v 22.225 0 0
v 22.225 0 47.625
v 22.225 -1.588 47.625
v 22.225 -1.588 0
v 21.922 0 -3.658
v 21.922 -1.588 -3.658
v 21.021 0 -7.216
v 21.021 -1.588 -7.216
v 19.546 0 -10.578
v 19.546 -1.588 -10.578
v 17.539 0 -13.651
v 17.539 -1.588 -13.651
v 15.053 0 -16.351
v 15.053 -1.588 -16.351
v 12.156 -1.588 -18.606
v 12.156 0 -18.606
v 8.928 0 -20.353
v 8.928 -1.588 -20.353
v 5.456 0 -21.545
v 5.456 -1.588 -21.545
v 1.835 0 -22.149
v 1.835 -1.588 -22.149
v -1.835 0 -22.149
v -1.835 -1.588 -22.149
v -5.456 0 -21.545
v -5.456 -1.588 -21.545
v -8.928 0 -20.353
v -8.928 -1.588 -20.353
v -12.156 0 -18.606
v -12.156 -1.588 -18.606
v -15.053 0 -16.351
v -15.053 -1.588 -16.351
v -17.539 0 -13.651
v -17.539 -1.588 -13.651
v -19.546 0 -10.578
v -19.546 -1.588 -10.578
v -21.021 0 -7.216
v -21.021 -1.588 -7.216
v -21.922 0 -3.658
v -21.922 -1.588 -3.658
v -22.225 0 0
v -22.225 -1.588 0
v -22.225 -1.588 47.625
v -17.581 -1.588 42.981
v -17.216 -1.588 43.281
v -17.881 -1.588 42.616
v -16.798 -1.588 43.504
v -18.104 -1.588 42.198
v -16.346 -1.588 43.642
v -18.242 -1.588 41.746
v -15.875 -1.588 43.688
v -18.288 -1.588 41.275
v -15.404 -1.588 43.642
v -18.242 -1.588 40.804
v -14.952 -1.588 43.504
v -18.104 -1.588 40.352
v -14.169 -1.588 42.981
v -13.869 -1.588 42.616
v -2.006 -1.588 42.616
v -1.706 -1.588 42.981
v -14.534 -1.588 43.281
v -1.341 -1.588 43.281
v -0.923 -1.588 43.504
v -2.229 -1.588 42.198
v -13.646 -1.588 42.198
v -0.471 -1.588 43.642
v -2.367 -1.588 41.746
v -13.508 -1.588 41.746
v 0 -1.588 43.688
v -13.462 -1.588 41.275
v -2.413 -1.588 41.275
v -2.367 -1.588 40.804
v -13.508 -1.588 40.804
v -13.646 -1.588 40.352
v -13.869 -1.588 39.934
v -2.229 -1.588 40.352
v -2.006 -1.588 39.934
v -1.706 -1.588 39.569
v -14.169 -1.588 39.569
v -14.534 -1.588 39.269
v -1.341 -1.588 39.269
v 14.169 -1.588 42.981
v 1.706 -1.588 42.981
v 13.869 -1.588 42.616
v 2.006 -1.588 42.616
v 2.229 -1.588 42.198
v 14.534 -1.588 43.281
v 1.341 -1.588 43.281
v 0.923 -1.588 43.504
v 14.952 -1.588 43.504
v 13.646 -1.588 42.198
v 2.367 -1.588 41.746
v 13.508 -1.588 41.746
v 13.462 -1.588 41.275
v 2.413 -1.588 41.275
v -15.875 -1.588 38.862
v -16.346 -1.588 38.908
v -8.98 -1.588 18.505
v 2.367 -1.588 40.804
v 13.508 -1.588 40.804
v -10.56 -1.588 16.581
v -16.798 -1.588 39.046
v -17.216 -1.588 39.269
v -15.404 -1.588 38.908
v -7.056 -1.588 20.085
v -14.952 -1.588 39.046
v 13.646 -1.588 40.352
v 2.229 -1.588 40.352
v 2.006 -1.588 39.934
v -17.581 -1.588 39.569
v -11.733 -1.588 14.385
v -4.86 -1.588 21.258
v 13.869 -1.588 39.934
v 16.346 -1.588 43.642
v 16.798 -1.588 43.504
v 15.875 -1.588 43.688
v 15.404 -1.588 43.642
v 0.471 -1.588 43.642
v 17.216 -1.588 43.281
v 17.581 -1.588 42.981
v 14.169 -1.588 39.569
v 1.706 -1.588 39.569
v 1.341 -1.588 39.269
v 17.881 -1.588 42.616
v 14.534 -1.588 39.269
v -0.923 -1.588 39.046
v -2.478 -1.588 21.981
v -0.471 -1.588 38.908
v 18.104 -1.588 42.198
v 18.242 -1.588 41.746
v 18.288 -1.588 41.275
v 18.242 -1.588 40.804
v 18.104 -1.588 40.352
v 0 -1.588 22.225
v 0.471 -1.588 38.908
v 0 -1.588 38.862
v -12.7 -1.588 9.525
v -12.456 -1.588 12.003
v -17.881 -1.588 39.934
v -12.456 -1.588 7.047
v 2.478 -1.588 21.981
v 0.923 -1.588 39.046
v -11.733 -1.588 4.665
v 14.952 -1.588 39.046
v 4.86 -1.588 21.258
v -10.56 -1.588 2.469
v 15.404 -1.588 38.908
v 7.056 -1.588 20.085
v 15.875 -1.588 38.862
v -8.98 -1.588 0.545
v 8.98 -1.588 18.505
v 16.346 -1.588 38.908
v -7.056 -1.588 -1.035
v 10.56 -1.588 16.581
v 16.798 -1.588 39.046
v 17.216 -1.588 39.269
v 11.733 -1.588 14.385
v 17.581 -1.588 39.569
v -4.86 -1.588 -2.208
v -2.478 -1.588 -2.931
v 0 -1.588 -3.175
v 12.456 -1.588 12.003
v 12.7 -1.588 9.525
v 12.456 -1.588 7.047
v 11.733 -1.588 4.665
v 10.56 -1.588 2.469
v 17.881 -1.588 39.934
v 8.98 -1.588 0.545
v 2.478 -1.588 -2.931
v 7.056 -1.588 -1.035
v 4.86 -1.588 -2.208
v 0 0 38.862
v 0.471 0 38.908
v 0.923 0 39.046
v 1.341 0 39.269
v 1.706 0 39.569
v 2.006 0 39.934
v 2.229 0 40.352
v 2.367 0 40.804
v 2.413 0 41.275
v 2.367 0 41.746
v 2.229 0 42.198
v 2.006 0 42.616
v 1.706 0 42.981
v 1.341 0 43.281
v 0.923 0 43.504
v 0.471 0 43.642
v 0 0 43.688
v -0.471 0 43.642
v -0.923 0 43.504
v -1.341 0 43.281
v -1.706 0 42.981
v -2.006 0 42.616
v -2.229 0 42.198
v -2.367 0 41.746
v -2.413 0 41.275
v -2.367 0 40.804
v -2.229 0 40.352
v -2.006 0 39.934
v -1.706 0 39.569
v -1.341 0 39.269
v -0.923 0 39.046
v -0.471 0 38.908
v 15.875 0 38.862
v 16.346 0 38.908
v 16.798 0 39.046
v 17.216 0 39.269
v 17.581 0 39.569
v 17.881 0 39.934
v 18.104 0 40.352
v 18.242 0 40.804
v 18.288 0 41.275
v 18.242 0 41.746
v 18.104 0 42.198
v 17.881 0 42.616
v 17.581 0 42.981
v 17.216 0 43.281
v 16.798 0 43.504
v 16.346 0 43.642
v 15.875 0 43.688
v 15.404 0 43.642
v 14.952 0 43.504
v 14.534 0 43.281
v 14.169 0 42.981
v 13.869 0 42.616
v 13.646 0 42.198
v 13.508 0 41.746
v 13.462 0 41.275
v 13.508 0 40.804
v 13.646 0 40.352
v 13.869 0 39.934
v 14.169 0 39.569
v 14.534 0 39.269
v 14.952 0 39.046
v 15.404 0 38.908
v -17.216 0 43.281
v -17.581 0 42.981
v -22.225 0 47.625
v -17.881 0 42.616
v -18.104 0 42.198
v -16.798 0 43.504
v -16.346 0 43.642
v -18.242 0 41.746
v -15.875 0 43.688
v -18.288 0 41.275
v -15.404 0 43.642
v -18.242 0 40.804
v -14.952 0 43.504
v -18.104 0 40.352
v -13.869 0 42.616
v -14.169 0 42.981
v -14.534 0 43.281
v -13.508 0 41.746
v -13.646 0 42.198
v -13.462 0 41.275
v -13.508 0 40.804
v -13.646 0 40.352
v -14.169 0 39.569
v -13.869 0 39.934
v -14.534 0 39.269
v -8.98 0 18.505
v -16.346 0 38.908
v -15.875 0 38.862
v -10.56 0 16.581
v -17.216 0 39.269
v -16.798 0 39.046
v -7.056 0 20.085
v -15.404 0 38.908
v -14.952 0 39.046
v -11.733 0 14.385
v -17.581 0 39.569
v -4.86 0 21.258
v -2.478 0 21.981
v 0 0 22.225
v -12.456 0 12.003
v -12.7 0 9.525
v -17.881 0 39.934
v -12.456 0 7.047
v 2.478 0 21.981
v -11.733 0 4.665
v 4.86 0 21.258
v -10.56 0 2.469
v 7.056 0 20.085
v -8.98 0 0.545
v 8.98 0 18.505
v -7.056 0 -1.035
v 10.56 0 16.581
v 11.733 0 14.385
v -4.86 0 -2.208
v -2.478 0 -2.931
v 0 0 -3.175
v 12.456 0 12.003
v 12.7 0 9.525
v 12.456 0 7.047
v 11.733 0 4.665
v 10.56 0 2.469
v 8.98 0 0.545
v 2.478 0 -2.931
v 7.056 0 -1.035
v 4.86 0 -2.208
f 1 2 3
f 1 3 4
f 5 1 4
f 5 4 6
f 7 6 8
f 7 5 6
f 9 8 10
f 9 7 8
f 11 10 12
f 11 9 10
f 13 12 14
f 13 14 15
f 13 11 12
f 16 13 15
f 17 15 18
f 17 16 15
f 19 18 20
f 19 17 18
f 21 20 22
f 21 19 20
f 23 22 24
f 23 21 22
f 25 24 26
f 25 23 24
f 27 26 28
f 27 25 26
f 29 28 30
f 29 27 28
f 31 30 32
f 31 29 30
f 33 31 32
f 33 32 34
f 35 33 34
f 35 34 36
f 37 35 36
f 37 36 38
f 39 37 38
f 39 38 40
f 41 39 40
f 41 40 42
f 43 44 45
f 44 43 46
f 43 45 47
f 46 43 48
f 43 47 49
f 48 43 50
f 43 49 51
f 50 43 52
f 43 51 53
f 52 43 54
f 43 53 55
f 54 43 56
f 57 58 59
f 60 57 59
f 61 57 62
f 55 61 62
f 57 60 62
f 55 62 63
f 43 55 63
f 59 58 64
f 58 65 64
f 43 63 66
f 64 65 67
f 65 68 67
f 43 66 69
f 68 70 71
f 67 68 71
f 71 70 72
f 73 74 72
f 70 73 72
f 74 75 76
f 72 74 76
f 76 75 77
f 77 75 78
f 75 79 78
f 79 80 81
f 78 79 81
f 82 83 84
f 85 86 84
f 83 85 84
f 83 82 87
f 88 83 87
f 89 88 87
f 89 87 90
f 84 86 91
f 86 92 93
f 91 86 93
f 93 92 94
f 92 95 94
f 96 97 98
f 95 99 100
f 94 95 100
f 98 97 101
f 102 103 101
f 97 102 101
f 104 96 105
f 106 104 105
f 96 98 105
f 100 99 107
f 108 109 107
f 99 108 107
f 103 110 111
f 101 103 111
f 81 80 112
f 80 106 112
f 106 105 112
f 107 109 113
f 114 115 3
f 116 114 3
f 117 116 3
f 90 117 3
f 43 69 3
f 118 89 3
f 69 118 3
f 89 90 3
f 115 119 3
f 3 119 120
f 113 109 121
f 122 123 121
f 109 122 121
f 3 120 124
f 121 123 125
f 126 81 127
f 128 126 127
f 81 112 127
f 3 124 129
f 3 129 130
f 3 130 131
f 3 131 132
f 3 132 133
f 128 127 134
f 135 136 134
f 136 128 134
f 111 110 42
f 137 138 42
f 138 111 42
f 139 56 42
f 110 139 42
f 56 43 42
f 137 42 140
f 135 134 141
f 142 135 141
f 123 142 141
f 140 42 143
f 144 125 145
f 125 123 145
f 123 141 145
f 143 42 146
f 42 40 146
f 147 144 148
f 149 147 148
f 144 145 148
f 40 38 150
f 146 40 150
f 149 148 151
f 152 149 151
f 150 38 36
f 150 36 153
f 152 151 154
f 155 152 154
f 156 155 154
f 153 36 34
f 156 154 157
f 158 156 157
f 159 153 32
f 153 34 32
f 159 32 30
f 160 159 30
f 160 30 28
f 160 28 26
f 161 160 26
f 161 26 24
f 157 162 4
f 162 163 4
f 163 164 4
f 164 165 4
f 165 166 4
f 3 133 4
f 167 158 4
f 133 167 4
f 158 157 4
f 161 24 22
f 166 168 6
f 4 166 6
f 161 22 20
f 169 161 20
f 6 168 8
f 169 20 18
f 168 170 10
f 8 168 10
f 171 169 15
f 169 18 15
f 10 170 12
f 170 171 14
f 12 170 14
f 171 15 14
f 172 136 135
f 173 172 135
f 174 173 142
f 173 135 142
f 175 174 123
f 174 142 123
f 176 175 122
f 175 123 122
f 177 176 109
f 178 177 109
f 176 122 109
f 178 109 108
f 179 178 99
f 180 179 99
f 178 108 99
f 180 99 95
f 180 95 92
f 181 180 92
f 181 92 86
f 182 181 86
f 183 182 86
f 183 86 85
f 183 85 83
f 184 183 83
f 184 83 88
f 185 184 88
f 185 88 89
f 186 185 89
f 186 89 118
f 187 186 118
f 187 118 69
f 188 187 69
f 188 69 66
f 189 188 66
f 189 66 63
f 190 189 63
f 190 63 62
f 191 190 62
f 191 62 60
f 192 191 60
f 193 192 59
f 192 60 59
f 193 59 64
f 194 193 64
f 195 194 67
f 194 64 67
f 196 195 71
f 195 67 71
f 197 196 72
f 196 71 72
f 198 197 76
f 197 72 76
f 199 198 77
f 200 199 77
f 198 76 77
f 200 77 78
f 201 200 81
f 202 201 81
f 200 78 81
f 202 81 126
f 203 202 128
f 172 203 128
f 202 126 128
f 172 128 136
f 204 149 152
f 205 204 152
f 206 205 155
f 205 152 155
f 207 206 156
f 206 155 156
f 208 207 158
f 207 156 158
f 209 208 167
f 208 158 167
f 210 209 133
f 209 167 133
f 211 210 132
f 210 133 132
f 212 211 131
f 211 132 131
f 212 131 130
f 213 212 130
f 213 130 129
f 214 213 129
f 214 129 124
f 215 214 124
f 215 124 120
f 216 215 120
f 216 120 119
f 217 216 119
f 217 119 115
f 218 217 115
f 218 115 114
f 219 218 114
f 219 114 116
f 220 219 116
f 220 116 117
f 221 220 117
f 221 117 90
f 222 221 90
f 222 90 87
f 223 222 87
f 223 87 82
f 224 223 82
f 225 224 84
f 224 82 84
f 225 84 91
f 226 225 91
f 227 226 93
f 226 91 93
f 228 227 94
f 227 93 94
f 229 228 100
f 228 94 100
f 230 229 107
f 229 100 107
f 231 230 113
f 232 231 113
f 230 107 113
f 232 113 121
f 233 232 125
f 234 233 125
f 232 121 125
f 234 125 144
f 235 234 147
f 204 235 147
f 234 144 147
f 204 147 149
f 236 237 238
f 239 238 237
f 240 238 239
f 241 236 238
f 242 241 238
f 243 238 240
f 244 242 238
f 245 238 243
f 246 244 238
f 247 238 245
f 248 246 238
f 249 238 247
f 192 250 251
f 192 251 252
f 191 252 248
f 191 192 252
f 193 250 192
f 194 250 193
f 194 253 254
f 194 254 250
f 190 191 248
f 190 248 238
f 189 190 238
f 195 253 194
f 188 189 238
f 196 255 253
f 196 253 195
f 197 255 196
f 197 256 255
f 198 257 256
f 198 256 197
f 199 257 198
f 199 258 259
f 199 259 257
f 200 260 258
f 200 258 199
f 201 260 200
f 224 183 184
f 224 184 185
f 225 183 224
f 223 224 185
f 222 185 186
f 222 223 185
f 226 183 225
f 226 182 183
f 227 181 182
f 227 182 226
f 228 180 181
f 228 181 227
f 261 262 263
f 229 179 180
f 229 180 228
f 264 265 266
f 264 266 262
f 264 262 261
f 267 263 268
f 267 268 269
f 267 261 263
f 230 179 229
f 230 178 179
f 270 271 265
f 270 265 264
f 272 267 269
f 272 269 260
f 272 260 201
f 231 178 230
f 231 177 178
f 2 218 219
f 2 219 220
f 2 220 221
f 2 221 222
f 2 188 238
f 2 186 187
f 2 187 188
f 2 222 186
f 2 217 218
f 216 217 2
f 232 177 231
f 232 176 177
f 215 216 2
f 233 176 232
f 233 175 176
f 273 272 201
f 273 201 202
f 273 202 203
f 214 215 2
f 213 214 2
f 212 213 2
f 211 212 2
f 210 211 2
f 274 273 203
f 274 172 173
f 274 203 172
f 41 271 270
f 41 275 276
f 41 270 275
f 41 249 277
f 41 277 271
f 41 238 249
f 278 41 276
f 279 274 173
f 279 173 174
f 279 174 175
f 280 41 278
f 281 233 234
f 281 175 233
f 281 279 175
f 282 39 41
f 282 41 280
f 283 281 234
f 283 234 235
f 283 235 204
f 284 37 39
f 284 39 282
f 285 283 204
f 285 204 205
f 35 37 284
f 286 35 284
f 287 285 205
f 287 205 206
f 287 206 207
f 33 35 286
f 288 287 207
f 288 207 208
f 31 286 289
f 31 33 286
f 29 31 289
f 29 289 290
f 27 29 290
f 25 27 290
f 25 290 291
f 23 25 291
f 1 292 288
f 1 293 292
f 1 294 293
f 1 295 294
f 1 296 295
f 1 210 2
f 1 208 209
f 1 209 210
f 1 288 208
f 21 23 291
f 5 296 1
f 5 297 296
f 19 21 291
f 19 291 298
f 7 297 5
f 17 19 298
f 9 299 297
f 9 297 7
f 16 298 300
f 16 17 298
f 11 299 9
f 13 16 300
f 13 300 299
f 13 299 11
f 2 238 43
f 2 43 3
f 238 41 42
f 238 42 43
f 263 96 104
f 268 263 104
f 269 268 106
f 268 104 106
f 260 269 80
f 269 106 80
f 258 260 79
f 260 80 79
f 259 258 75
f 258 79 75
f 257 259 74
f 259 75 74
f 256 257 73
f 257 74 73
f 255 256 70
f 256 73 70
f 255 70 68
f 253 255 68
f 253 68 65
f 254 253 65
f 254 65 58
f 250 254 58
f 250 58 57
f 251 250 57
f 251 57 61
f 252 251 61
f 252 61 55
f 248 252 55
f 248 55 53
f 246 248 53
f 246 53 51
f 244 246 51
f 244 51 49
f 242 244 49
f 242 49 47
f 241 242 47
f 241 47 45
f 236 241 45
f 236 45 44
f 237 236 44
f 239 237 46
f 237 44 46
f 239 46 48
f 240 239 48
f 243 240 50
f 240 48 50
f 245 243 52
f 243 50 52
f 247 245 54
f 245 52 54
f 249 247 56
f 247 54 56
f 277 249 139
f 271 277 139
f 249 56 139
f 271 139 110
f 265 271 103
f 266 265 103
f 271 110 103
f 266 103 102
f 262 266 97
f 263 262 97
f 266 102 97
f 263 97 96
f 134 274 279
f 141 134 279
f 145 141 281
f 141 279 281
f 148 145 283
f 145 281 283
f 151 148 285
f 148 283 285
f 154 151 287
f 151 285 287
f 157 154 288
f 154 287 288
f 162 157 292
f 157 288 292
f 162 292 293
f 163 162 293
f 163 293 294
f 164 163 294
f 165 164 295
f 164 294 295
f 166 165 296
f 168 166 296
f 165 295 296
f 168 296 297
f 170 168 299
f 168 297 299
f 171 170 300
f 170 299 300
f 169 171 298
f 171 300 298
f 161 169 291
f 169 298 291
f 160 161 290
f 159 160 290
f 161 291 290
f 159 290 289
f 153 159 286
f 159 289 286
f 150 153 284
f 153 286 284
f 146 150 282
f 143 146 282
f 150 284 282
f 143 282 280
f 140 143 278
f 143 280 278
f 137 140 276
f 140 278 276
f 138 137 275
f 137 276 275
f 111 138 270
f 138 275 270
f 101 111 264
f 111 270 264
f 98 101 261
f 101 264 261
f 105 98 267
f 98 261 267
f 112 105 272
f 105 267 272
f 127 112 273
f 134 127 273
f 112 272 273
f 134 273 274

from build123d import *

# Parameters (mm, degrees)
SKETCH1_R          = 12.7
BASE_FLANGE1_DEPTH = 1.5875
SKETCH12_R         = 2.413
CUT_EXTRUDE1_DEPTH = 53.579572138


# Sheet-metal steps are written as plain solids
with BuildPart() as part:
    # Sketch1 → Base-Flange1 (new body)
    with BuildSketch(Plane(origin=(0, 0, 0), x_dir=(1, 0, 0), z_dir=(0, 1, 0))):
        with BuildLine():
            Line((-22.225, 0), (-22.225, -47.625))
            Line((-22.225, -47.625), (22.225, -47.625))
            Line((22.225, -47.625), (22.225, 0))
            ThreePointArc((22.225, 0), (0, 22.225), (-22.225, 0))
        make_face()
        with Locations(Location((0, -9.525, 0), (0, 0, 270))):
            Circle(SKETCH1_R, mode=Mode.SUBTRACT)
    extrude(amount=-BASE_FLANGE1_DEPTH)

    # Sketch12 → Cut-Extrude1 (cut, through all)
    with BuildSketch(Plane.XZ.offset(1.5875)):
        with Locations(Location((15.875, 41.275, 0), (0, 0, 270))):
            Circle(SKETCH12_R)
        with Locations(Location((0, 41.275, 0), (0, 0, 270))):
            Circle(SKETCH12_R)
        with Locations(Location((-15.875, 41.275, 0), (0, 0, 270))):
            Circle(SKETCH12_R)
    extrude(amount=-CUT_EXTRUDE1_DEPTH, mode=Mode.SUBTRACT)


solid = part.part
